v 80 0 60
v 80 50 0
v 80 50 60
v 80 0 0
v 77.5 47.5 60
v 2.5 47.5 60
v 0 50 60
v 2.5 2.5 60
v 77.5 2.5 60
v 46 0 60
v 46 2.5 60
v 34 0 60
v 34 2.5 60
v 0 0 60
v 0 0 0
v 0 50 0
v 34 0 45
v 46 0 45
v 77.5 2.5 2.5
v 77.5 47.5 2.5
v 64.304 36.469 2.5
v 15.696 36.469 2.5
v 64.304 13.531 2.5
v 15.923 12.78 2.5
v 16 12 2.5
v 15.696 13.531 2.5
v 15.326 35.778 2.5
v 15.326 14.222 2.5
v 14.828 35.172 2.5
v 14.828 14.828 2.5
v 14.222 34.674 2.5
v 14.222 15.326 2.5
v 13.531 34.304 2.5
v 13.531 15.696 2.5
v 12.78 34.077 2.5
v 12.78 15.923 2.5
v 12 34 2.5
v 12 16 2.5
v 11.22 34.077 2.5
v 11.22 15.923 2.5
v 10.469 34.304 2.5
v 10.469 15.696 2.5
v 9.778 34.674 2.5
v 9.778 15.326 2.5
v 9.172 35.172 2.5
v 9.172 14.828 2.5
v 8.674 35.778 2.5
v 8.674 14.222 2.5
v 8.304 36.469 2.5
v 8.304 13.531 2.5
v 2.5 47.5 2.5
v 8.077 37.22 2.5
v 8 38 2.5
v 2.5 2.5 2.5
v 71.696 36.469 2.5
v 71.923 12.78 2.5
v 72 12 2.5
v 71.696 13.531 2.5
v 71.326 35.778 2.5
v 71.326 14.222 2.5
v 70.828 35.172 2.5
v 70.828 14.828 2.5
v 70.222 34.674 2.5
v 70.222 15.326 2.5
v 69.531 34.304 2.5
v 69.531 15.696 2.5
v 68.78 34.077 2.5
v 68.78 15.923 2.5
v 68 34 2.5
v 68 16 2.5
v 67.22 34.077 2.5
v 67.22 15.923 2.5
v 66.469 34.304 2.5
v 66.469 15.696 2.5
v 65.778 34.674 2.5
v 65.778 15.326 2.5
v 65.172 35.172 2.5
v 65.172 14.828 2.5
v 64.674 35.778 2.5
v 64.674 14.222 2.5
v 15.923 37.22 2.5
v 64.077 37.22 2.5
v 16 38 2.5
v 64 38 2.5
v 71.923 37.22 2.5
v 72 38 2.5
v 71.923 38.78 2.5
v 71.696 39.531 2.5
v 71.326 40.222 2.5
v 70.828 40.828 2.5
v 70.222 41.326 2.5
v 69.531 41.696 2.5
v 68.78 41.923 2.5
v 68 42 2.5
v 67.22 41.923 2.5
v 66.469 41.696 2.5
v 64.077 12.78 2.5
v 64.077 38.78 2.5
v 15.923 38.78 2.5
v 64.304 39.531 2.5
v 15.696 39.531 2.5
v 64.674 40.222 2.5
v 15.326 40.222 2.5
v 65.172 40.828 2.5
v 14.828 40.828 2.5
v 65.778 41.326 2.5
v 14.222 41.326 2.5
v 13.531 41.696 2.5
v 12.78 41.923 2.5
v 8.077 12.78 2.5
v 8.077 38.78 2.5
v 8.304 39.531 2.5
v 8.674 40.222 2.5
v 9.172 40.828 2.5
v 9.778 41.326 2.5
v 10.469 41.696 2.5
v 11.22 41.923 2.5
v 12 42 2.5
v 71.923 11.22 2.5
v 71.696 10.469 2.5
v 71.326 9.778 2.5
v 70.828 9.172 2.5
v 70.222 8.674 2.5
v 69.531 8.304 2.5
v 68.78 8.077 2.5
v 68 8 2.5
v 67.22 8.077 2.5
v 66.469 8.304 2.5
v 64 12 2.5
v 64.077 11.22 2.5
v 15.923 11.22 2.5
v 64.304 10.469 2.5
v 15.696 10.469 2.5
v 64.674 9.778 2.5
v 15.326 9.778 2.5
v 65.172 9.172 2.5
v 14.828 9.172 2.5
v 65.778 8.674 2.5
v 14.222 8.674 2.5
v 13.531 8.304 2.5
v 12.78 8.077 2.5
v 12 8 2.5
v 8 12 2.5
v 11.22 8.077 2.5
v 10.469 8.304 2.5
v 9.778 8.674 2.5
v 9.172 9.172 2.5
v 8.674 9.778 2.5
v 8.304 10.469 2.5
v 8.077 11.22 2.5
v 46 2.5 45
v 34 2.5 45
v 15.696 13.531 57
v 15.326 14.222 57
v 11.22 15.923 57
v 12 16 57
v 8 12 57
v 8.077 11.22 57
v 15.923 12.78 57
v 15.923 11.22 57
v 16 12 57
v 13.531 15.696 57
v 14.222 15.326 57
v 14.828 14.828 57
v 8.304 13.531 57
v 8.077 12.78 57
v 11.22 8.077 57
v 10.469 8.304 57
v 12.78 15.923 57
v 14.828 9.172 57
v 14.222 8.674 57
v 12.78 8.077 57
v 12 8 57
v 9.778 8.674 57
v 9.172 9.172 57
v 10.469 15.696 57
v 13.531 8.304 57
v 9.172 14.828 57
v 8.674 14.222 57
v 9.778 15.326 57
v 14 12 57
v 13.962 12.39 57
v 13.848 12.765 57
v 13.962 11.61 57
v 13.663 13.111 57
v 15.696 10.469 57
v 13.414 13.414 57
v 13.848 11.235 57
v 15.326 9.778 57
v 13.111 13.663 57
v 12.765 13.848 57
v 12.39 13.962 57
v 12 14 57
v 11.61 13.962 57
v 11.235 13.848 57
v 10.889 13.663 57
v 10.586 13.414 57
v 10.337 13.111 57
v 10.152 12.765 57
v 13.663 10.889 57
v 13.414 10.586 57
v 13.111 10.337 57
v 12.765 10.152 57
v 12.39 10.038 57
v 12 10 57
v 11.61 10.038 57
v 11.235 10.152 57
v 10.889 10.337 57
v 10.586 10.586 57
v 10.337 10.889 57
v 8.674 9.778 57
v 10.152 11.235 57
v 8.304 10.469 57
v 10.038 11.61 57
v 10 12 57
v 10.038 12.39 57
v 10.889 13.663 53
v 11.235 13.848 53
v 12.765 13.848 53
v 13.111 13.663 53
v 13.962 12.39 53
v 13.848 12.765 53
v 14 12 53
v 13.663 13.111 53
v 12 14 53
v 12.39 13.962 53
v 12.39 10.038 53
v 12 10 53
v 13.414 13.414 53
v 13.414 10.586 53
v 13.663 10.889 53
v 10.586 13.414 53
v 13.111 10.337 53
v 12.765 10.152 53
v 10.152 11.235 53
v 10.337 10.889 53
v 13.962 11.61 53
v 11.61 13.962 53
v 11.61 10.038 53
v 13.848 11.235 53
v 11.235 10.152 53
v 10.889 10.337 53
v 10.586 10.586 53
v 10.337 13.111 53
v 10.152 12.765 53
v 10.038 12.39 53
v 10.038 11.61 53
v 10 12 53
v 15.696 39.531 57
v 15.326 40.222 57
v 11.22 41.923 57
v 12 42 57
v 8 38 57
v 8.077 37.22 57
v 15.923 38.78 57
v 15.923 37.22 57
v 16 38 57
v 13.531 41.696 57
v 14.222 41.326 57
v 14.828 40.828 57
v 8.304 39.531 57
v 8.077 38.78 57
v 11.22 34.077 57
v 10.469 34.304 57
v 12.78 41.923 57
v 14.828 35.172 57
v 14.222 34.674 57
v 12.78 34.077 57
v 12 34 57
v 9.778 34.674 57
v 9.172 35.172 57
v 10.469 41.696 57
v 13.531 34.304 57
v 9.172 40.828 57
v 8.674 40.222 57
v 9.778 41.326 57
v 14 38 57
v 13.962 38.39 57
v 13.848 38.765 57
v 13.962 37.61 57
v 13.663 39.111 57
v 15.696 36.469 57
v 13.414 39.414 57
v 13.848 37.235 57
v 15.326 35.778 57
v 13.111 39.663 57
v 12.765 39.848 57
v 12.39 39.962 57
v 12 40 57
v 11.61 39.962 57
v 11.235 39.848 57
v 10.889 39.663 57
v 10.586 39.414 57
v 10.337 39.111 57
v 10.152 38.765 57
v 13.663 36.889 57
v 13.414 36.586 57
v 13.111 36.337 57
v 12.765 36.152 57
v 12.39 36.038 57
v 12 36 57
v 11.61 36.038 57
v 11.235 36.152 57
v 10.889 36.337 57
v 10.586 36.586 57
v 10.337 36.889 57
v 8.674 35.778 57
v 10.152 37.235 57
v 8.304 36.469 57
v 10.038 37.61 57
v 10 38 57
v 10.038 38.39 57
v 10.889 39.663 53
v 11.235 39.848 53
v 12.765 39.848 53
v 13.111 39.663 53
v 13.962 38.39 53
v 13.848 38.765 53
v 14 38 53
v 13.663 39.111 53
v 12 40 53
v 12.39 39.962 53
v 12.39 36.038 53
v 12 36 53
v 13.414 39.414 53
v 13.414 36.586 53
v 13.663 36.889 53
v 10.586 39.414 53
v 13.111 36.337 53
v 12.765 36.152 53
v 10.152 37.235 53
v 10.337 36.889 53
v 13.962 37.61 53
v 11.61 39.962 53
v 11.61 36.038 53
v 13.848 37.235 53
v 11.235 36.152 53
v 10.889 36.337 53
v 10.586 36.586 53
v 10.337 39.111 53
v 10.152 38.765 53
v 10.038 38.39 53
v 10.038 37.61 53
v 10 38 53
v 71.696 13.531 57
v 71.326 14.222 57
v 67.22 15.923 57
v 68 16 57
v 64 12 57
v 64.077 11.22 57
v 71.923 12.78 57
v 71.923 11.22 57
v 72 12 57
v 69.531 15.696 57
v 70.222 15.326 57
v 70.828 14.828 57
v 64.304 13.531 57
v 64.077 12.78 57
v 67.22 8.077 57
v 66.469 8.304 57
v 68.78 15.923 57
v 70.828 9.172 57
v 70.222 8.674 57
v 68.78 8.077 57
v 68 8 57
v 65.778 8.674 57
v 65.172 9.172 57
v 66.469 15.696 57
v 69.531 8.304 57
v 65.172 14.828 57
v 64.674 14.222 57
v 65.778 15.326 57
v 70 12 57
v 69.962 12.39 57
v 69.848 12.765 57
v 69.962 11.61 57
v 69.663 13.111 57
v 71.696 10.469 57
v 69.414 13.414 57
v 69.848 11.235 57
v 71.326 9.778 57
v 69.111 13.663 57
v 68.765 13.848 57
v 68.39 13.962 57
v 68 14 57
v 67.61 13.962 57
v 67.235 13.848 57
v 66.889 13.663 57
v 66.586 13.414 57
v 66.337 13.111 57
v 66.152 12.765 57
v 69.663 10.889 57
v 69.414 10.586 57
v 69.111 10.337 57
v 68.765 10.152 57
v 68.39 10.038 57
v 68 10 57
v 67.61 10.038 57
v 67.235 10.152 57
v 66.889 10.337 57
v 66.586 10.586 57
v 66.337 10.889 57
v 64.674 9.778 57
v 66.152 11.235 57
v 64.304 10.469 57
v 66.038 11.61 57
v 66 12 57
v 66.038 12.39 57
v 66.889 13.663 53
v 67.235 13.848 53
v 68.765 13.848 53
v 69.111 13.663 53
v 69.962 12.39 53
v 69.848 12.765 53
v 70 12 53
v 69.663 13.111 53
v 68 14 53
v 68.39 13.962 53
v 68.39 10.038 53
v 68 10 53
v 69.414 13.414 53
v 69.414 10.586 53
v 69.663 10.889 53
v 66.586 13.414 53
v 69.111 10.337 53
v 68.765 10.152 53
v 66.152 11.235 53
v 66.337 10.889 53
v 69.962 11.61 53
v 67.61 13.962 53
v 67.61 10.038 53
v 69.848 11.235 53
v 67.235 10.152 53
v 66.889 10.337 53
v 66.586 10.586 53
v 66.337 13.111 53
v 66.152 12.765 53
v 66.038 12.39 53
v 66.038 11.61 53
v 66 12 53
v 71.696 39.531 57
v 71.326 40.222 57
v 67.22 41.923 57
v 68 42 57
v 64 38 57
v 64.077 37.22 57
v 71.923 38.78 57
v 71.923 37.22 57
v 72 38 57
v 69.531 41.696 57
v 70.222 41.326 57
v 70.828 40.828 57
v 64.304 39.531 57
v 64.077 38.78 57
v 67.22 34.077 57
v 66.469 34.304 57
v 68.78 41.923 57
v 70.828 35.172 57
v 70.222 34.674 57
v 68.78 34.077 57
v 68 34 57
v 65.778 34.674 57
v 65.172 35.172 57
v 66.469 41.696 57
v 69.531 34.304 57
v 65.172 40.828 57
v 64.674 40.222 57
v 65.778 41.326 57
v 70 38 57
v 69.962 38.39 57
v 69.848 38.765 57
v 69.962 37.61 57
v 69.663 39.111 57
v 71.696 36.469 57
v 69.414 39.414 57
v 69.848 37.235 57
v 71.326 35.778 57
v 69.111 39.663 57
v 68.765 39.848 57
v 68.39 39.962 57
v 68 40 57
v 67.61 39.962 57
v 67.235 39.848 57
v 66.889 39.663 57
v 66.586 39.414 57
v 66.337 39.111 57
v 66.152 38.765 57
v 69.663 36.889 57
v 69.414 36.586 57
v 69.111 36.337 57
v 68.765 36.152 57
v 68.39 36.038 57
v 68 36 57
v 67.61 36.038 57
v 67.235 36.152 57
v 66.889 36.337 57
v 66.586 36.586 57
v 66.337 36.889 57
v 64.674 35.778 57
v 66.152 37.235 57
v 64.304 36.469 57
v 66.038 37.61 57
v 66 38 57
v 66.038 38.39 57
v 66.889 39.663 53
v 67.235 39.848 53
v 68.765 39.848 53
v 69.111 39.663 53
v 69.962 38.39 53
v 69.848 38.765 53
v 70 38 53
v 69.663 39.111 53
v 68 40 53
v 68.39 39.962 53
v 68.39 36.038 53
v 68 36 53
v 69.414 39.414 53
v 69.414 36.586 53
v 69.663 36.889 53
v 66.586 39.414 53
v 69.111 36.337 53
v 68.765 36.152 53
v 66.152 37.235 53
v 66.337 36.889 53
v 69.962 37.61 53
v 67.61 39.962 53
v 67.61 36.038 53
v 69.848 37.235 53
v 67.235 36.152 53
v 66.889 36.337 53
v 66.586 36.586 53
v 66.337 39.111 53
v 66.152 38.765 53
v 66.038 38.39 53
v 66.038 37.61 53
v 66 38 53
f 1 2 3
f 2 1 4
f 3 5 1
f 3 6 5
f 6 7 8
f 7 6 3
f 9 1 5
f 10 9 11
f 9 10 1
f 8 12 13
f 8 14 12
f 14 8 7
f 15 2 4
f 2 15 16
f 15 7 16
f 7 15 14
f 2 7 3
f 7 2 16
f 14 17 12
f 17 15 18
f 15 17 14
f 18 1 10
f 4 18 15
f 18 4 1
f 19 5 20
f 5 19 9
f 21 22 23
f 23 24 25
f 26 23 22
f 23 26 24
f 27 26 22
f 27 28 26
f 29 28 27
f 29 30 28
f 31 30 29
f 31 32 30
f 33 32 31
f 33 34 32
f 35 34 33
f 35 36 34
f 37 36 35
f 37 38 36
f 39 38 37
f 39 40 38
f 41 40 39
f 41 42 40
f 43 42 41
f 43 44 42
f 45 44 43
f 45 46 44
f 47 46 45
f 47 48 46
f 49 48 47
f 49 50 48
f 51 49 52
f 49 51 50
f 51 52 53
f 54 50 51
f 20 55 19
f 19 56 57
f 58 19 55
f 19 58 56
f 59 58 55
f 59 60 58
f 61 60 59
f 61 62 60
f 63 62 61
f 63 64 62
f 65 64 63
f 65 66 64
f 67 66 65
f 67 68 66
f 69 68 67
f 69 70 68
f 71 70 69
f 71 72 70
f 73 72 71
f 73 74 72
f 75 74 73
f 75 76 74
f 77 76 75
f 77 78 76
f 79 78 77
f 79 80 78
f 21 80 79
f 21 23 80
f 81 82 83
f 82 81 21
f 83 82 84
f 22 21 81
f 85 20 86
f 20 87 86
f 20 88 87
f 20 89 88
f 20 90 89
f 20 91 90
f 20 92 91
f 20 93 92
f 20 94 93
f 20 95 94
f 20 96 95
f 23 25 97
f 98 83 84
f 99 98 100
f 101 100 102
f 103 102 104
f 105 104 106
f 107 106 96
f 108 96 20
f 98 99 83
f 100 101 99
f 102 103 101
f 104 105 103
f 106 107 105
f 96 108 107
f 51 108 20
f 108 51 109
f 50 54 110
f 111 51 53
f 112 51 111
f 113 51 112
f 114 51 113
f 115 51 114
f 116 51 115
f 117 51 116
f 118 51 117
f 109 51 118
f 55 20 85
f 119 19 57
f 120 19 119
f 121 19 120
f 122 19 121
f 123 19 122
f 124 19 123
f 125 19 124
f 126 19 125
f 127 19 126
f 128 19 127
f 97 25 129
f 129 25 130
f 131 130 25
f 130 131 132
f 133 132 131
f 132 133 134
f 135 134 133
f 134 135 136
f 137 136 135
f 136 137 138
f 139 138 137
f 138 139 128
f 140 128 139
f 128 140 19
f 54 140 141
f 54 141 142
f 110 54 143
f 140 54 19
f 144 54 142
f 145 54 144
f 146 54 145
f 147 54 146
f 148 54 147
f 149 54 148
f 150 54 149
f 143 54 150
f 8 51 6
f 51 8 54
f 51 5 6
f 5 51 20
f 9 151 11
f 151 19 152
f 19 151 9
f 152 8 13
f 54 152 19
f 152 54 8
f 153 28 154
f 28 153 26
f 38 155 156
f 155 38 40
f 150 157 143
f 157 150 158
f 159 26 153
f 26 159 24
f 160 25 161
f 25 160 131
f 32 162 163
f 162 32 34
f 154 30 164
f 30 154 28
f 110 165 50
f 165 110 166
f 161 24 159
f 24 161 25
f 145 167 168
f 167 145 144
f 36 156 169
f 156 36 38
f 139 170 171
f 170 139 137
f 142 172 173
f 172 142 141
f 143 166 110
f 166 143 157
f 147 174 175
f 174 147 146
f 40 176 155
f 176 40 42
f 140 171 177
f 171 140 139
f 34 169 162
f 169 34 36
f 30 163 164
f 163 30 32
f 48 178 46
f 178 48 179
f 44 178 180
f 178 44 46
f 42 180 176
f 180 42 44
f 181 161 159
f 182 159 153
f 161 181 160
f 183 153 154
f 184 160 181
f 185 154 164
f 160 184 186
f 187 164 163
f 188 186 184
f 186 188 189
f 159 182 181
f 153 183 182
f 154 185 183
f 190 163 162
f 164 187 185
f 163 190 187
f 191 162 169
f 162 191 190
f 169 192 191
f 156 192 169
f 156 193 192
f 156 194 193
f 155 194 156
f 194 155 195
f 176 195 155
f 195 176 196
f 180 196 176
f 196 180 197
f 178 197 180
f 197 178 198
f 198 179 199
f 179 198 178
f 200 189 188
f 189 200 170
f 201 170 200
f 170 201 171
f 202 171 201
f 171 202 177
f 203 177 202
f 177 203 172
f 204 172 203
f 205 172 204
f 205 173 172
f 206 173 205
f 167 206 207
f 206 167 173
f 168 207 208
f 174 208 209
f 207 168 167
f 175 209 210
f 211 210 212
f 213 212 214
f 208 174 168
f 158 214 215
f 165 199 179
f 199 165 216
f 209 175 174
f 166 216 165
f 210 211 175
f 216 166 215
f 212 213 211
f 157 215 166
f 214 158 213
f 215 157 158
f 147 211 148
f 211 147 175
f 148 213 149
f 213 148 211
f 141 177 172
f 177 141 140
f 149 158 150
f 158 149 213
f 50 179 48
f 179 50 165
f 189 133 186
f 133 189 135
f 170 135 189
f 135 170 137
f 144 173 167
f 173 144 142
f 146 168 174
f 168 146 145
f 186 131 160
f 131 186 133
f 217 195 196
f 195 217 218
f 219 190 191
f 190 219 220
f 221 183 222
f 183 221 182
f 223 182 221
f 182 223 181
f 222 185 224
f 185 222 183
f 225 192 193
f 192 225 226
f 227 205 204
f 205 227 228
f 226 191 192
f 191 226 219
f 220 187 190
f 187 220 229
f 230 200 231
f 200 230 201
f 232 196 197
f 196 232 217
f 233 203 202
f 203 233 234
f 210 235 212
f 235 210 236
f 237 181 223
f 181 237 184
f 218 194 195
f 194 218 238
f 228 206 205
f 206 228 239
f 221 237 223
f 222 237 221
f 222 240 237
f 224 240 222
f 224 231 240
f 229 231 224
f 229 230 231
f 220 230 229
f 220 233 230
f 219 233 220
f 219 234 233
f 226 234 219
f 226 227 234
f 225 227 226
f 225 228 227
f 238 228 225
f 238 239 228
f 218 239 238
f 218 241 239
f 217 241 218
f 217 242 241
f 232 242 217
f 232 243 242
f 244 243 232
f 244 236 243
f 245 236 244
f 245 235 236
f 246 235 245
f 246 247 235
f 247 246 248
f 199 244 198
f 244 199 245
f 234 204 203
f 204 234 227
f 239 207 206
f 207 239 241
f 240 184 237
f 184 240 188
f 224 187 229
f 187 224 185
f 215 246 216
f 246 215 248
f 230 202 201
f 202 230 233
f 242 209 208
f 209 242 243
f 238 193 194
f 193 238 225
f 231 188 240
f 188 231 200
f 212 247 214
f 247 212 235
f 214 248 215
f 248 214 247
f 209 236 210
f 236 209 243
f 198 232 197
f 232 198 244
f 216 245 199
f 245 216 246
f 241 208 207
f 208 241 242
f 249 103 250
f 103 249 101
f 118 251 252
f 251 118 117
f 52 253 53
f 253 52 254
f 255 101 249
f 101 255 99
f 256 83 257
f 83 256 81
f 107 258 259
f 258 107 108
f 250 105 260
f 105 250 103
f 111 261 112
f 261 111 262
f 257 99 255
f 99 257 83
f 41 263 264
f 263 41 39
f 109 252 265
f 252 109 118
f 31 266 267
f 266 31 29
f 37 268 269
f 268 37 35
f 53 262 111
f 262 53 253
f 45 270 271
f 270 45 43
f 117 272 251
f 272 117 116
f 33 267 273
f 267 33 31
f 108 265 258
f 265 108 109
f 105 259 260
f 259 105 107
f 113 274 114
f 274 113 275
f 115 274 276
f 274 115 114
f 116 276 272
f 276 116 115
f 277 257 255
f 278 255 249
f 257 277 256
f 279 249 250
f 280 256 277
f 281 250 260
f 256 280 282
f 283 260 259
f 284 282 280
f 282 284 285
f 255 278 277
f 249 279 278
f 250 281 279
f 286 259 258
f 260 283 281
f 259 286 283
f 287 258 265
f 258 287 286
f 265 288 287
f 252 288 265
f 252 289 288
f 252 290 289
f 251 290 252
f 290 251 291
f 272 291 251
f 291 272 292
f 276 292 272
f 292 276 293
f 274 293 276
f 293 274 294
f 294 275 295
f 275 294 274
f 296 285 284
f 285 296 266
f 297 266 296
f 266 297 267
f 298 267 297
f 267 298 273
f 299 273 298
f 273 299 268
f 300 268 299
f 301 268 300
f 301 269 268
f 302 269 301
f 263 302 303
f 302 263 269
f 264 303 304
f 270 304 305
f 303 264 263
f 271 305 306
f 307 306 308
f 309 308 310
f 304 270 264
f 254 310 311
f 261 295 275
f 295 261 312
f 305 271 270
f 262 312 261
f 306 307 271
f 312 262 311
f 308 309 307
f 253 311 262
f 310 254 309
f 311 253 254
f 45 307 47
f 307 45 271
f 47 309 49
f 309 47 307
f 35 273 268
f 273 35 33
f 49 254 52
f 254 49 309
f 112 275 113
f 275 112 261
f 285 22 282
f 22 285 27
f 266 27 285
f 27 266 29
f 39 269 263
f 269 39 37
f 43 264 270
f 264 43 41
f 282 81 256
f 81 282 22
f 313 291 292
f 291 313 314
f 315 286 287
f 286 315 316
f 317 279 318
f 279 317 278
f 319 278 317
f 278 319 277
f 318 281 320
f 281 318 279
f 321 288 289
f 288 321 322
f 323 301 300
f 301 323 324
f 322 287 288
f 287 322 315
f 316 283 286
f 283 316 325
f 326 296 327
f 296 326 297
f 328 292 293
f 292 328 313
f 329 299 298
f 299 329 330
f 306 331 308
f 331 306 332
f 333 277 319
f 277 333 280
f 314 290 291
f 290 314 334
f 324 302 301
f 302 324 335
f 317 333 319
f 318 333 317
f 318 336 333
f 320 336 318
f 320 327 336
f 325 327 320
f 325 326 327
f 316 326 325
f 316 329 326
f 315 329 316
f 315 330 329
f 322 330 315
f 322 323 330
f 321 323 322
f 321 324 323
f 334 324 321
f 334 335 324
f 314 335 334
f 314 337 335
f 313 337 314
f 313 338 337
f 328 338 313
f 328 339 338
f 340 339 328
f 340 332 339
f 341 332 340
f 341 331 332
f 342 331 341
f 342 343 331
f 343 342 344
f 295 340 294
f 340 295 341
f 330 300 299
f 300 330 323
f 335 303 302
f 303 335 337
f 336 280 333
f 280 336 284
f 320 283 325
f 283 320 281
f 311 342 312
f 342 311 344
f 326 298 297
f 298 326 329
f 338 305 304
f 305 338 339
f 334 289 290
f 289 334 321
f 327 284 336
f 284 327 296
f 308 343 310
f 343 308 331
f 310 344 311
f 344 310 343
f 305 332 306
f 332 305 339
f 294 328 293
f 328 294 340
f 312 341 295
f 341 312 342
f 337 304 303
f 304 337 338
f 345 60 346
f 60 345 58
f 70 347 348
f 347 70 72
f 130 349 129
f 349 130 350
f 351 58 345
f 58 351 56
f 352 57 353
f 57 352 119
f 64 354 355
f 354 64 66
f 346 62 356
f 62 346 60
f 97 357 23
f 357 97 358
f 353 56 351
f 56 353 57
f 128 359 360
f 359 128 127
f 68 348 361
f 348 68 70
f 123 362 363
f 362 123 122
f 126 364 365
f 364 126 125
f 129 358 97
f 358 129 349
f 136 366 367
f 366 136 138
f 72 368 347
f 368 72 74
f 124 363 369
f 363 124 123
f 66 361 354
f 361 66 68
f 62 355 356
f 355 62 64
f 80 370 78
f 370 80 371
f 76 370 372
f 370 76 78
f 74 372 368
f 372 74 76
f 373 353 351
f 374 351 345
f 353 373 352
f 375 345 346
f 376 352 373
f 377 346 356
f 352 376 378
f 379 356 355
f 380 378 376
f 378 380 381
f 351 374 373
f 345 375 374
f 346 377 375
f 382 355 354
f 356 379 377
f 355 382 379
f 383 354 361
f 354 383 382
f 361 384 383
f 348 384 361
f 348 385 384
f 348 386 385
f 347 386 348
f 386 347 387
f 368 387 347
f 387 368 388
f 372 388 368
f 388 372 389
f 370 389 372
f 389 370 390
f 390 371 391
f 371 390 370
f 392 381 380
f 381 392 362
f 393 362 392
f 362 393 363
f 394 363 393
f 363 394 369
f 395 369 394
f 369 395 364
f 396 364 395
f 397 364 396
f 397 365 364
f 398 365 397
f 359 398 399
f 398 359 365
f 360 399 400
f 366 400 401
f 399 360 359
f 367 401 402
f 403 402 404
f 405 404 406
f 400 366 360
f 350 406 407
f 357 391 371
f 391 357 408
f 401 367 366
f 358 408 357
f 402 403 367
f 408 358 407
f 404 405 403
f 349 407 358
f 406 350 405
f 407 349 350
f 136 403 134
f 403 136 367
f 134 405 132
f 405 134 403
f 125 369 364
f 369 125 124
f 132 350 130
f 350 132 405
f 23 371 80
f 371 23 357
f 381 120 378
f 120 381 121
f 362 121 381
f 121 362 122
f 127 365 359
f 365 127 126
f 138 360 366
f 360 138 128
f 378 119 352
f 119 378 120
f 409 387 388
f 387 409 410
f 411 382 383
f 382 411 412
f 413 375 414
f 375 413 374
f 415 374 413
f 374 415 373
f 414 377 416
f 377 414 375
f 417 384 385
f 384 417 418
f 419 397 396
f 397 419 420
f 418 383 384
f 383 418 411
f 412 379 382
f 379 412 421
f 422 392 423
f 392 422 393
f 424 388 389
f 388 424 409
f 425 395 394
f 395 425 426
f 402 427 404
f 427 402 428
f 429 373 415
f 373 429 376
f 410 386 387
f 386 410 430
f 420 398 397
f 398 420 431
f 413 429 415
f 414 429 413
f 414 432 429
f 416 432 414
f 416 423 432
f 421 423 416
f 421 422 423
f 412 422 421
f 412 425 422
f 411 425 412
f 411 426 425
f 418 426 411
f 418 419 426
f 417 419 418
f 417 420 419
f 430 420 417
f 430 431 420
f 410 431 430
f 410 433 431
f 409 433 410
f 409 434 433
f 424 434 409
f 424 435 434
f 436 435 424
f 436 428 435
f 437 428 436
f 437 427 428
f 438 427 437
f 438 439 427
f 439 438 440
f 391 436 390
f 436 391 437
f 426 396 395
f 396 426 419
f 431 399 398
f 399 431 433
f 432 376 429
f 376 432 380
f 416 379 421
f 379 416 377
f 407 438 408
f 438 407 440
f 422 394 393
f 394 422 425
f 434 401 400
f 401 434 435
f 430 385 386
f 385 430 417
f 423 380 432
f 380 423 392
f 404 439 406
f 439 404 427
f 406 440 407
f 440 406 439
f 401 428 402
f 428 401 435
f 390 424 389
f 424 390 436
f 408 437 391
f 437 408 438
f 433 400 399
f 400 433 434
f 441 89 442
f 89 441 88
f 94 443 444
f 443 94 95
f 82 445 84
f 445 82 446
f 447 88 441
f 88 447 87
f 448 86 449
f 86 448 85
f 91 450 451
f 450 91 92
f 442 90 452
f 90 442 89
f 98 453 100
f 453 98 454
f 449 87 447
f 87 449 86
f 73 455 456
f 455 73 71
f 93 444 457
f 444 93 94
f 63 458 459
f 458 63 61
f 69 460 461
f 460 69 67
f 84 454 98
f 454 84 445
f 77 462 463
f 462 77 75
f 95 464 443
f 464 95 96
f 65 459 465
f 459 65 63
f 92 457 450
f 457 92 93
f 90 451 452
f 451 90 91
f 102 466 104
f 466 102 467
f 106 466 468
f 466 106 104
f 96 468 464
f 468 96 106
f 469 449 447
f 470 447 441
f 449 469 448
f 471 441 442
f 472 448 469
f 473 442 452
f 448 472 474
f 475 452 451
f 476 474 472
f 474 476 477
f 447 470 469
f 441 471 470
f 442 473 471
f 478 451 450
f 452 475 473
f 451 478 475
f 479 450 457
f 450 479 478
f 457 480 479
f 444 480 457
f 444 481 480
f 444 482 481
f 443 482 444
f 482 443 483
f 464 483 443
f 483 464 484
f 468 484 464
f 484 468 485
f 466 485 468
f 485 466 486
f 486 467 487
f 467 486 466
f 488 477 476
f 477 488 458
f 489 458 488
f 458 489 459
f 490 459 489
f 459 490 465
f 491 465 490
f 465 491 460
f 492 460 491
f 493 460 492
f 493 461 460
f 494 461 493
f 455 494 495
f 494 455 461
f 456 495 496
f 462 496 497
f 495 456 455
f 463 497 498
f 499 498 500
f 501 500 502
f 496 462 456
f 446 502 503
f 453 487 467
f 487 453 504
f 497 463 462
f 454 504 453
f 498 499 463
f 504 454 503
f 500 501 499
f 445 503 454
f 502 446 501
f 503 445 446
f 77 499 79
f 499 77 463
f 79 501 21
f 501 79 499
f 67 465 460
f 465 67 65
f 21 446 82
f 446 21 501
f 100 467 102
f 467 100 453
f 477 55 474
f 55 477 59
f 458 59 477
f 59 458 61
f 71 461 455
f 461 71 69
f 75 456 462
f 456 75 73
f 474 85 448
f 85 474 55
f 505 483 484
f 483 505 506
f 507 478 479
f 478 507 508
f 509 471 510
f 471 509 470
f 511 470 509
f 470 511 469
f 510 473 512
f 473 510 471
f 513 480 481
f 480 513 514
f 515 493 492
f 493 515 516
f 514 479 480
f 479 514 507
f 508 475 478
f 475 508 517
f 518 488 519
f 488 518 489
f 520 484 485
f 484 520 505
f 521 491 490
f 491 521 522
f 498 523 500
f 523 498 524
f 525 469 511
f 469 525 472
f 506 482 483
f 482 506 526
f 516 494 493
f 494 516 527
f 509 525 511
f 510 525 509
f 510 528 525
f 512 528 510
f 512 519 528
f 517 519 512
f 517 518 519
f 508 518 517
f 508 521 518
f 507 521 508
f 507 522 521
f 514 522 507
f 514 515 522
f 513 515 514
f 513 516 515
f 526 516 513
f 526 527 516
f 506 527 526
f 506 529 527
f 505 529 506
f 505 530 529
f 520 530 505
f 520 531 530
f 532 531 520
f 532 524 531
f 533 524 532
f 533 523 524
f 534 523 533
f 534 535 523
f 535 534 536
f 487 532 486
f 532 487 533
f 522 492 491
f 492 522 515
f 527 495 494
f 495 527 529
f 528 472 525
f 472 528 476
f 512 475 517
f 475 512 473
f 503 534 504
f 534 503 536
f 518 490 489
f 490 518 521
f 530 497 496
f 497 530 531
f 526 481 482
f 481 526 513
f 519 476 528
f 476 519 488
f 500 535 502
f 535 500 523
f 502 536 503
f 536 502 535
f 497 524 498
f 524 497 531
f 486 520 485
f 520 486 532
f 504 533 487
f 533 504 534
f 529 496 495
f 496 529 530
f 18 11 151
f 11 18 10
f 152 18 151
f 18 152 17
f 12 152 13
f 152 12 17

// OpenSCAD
$fn = 32;

// ----------------------------------------------------------------------
// Enclosure box: both enclosure
// ----------------------------------------------------------------------

// --- parameters (mm) ---
box_l = 80;               // outer length, X
box_w = 50;               // outer width, Y
box_h = 60;               // outer height
wall_t = 2.5;             // wall thickness
boss_r = 4;               // corner boss radius
hole_r = 2;               // boss screw hole radius
boss_in = 12;             // boss inset from the corners
notch_w = 12;             // cable notch width
notch_h = 15;             // cable notch height

inner_h = box_h - wall_t;  // cavity depth
boss_h = inner_h - 2;  // corner boss height

difference() {
  union() {
    difference() {
      cube([box_l, box_w, box_h]);
      translate([wall_t, wall_t, wall_t])
        cube([box_l - 2 * wall_t, box_w - 2 * wall_t, box_h]);
    }
    for (sx = [0, 1], sy = [0, 1])
      translate([sx ? box_l - boss_in : boss_in,
                 sy ? box_w - boss_in : boss_in, wall_t - 1])
        difference() {
          cylinder(r = boss_r, h = boss_h);
          translate([0, 0, boss_h - 4])
            cylinder(r = hole_r, h = 5);
        }
  }
  translate([box_l / 2 - notch_w / 2, -1, box_h - notch_h])
    cube([notch_w, wall_t + 2, notch_h + 1]);
}
